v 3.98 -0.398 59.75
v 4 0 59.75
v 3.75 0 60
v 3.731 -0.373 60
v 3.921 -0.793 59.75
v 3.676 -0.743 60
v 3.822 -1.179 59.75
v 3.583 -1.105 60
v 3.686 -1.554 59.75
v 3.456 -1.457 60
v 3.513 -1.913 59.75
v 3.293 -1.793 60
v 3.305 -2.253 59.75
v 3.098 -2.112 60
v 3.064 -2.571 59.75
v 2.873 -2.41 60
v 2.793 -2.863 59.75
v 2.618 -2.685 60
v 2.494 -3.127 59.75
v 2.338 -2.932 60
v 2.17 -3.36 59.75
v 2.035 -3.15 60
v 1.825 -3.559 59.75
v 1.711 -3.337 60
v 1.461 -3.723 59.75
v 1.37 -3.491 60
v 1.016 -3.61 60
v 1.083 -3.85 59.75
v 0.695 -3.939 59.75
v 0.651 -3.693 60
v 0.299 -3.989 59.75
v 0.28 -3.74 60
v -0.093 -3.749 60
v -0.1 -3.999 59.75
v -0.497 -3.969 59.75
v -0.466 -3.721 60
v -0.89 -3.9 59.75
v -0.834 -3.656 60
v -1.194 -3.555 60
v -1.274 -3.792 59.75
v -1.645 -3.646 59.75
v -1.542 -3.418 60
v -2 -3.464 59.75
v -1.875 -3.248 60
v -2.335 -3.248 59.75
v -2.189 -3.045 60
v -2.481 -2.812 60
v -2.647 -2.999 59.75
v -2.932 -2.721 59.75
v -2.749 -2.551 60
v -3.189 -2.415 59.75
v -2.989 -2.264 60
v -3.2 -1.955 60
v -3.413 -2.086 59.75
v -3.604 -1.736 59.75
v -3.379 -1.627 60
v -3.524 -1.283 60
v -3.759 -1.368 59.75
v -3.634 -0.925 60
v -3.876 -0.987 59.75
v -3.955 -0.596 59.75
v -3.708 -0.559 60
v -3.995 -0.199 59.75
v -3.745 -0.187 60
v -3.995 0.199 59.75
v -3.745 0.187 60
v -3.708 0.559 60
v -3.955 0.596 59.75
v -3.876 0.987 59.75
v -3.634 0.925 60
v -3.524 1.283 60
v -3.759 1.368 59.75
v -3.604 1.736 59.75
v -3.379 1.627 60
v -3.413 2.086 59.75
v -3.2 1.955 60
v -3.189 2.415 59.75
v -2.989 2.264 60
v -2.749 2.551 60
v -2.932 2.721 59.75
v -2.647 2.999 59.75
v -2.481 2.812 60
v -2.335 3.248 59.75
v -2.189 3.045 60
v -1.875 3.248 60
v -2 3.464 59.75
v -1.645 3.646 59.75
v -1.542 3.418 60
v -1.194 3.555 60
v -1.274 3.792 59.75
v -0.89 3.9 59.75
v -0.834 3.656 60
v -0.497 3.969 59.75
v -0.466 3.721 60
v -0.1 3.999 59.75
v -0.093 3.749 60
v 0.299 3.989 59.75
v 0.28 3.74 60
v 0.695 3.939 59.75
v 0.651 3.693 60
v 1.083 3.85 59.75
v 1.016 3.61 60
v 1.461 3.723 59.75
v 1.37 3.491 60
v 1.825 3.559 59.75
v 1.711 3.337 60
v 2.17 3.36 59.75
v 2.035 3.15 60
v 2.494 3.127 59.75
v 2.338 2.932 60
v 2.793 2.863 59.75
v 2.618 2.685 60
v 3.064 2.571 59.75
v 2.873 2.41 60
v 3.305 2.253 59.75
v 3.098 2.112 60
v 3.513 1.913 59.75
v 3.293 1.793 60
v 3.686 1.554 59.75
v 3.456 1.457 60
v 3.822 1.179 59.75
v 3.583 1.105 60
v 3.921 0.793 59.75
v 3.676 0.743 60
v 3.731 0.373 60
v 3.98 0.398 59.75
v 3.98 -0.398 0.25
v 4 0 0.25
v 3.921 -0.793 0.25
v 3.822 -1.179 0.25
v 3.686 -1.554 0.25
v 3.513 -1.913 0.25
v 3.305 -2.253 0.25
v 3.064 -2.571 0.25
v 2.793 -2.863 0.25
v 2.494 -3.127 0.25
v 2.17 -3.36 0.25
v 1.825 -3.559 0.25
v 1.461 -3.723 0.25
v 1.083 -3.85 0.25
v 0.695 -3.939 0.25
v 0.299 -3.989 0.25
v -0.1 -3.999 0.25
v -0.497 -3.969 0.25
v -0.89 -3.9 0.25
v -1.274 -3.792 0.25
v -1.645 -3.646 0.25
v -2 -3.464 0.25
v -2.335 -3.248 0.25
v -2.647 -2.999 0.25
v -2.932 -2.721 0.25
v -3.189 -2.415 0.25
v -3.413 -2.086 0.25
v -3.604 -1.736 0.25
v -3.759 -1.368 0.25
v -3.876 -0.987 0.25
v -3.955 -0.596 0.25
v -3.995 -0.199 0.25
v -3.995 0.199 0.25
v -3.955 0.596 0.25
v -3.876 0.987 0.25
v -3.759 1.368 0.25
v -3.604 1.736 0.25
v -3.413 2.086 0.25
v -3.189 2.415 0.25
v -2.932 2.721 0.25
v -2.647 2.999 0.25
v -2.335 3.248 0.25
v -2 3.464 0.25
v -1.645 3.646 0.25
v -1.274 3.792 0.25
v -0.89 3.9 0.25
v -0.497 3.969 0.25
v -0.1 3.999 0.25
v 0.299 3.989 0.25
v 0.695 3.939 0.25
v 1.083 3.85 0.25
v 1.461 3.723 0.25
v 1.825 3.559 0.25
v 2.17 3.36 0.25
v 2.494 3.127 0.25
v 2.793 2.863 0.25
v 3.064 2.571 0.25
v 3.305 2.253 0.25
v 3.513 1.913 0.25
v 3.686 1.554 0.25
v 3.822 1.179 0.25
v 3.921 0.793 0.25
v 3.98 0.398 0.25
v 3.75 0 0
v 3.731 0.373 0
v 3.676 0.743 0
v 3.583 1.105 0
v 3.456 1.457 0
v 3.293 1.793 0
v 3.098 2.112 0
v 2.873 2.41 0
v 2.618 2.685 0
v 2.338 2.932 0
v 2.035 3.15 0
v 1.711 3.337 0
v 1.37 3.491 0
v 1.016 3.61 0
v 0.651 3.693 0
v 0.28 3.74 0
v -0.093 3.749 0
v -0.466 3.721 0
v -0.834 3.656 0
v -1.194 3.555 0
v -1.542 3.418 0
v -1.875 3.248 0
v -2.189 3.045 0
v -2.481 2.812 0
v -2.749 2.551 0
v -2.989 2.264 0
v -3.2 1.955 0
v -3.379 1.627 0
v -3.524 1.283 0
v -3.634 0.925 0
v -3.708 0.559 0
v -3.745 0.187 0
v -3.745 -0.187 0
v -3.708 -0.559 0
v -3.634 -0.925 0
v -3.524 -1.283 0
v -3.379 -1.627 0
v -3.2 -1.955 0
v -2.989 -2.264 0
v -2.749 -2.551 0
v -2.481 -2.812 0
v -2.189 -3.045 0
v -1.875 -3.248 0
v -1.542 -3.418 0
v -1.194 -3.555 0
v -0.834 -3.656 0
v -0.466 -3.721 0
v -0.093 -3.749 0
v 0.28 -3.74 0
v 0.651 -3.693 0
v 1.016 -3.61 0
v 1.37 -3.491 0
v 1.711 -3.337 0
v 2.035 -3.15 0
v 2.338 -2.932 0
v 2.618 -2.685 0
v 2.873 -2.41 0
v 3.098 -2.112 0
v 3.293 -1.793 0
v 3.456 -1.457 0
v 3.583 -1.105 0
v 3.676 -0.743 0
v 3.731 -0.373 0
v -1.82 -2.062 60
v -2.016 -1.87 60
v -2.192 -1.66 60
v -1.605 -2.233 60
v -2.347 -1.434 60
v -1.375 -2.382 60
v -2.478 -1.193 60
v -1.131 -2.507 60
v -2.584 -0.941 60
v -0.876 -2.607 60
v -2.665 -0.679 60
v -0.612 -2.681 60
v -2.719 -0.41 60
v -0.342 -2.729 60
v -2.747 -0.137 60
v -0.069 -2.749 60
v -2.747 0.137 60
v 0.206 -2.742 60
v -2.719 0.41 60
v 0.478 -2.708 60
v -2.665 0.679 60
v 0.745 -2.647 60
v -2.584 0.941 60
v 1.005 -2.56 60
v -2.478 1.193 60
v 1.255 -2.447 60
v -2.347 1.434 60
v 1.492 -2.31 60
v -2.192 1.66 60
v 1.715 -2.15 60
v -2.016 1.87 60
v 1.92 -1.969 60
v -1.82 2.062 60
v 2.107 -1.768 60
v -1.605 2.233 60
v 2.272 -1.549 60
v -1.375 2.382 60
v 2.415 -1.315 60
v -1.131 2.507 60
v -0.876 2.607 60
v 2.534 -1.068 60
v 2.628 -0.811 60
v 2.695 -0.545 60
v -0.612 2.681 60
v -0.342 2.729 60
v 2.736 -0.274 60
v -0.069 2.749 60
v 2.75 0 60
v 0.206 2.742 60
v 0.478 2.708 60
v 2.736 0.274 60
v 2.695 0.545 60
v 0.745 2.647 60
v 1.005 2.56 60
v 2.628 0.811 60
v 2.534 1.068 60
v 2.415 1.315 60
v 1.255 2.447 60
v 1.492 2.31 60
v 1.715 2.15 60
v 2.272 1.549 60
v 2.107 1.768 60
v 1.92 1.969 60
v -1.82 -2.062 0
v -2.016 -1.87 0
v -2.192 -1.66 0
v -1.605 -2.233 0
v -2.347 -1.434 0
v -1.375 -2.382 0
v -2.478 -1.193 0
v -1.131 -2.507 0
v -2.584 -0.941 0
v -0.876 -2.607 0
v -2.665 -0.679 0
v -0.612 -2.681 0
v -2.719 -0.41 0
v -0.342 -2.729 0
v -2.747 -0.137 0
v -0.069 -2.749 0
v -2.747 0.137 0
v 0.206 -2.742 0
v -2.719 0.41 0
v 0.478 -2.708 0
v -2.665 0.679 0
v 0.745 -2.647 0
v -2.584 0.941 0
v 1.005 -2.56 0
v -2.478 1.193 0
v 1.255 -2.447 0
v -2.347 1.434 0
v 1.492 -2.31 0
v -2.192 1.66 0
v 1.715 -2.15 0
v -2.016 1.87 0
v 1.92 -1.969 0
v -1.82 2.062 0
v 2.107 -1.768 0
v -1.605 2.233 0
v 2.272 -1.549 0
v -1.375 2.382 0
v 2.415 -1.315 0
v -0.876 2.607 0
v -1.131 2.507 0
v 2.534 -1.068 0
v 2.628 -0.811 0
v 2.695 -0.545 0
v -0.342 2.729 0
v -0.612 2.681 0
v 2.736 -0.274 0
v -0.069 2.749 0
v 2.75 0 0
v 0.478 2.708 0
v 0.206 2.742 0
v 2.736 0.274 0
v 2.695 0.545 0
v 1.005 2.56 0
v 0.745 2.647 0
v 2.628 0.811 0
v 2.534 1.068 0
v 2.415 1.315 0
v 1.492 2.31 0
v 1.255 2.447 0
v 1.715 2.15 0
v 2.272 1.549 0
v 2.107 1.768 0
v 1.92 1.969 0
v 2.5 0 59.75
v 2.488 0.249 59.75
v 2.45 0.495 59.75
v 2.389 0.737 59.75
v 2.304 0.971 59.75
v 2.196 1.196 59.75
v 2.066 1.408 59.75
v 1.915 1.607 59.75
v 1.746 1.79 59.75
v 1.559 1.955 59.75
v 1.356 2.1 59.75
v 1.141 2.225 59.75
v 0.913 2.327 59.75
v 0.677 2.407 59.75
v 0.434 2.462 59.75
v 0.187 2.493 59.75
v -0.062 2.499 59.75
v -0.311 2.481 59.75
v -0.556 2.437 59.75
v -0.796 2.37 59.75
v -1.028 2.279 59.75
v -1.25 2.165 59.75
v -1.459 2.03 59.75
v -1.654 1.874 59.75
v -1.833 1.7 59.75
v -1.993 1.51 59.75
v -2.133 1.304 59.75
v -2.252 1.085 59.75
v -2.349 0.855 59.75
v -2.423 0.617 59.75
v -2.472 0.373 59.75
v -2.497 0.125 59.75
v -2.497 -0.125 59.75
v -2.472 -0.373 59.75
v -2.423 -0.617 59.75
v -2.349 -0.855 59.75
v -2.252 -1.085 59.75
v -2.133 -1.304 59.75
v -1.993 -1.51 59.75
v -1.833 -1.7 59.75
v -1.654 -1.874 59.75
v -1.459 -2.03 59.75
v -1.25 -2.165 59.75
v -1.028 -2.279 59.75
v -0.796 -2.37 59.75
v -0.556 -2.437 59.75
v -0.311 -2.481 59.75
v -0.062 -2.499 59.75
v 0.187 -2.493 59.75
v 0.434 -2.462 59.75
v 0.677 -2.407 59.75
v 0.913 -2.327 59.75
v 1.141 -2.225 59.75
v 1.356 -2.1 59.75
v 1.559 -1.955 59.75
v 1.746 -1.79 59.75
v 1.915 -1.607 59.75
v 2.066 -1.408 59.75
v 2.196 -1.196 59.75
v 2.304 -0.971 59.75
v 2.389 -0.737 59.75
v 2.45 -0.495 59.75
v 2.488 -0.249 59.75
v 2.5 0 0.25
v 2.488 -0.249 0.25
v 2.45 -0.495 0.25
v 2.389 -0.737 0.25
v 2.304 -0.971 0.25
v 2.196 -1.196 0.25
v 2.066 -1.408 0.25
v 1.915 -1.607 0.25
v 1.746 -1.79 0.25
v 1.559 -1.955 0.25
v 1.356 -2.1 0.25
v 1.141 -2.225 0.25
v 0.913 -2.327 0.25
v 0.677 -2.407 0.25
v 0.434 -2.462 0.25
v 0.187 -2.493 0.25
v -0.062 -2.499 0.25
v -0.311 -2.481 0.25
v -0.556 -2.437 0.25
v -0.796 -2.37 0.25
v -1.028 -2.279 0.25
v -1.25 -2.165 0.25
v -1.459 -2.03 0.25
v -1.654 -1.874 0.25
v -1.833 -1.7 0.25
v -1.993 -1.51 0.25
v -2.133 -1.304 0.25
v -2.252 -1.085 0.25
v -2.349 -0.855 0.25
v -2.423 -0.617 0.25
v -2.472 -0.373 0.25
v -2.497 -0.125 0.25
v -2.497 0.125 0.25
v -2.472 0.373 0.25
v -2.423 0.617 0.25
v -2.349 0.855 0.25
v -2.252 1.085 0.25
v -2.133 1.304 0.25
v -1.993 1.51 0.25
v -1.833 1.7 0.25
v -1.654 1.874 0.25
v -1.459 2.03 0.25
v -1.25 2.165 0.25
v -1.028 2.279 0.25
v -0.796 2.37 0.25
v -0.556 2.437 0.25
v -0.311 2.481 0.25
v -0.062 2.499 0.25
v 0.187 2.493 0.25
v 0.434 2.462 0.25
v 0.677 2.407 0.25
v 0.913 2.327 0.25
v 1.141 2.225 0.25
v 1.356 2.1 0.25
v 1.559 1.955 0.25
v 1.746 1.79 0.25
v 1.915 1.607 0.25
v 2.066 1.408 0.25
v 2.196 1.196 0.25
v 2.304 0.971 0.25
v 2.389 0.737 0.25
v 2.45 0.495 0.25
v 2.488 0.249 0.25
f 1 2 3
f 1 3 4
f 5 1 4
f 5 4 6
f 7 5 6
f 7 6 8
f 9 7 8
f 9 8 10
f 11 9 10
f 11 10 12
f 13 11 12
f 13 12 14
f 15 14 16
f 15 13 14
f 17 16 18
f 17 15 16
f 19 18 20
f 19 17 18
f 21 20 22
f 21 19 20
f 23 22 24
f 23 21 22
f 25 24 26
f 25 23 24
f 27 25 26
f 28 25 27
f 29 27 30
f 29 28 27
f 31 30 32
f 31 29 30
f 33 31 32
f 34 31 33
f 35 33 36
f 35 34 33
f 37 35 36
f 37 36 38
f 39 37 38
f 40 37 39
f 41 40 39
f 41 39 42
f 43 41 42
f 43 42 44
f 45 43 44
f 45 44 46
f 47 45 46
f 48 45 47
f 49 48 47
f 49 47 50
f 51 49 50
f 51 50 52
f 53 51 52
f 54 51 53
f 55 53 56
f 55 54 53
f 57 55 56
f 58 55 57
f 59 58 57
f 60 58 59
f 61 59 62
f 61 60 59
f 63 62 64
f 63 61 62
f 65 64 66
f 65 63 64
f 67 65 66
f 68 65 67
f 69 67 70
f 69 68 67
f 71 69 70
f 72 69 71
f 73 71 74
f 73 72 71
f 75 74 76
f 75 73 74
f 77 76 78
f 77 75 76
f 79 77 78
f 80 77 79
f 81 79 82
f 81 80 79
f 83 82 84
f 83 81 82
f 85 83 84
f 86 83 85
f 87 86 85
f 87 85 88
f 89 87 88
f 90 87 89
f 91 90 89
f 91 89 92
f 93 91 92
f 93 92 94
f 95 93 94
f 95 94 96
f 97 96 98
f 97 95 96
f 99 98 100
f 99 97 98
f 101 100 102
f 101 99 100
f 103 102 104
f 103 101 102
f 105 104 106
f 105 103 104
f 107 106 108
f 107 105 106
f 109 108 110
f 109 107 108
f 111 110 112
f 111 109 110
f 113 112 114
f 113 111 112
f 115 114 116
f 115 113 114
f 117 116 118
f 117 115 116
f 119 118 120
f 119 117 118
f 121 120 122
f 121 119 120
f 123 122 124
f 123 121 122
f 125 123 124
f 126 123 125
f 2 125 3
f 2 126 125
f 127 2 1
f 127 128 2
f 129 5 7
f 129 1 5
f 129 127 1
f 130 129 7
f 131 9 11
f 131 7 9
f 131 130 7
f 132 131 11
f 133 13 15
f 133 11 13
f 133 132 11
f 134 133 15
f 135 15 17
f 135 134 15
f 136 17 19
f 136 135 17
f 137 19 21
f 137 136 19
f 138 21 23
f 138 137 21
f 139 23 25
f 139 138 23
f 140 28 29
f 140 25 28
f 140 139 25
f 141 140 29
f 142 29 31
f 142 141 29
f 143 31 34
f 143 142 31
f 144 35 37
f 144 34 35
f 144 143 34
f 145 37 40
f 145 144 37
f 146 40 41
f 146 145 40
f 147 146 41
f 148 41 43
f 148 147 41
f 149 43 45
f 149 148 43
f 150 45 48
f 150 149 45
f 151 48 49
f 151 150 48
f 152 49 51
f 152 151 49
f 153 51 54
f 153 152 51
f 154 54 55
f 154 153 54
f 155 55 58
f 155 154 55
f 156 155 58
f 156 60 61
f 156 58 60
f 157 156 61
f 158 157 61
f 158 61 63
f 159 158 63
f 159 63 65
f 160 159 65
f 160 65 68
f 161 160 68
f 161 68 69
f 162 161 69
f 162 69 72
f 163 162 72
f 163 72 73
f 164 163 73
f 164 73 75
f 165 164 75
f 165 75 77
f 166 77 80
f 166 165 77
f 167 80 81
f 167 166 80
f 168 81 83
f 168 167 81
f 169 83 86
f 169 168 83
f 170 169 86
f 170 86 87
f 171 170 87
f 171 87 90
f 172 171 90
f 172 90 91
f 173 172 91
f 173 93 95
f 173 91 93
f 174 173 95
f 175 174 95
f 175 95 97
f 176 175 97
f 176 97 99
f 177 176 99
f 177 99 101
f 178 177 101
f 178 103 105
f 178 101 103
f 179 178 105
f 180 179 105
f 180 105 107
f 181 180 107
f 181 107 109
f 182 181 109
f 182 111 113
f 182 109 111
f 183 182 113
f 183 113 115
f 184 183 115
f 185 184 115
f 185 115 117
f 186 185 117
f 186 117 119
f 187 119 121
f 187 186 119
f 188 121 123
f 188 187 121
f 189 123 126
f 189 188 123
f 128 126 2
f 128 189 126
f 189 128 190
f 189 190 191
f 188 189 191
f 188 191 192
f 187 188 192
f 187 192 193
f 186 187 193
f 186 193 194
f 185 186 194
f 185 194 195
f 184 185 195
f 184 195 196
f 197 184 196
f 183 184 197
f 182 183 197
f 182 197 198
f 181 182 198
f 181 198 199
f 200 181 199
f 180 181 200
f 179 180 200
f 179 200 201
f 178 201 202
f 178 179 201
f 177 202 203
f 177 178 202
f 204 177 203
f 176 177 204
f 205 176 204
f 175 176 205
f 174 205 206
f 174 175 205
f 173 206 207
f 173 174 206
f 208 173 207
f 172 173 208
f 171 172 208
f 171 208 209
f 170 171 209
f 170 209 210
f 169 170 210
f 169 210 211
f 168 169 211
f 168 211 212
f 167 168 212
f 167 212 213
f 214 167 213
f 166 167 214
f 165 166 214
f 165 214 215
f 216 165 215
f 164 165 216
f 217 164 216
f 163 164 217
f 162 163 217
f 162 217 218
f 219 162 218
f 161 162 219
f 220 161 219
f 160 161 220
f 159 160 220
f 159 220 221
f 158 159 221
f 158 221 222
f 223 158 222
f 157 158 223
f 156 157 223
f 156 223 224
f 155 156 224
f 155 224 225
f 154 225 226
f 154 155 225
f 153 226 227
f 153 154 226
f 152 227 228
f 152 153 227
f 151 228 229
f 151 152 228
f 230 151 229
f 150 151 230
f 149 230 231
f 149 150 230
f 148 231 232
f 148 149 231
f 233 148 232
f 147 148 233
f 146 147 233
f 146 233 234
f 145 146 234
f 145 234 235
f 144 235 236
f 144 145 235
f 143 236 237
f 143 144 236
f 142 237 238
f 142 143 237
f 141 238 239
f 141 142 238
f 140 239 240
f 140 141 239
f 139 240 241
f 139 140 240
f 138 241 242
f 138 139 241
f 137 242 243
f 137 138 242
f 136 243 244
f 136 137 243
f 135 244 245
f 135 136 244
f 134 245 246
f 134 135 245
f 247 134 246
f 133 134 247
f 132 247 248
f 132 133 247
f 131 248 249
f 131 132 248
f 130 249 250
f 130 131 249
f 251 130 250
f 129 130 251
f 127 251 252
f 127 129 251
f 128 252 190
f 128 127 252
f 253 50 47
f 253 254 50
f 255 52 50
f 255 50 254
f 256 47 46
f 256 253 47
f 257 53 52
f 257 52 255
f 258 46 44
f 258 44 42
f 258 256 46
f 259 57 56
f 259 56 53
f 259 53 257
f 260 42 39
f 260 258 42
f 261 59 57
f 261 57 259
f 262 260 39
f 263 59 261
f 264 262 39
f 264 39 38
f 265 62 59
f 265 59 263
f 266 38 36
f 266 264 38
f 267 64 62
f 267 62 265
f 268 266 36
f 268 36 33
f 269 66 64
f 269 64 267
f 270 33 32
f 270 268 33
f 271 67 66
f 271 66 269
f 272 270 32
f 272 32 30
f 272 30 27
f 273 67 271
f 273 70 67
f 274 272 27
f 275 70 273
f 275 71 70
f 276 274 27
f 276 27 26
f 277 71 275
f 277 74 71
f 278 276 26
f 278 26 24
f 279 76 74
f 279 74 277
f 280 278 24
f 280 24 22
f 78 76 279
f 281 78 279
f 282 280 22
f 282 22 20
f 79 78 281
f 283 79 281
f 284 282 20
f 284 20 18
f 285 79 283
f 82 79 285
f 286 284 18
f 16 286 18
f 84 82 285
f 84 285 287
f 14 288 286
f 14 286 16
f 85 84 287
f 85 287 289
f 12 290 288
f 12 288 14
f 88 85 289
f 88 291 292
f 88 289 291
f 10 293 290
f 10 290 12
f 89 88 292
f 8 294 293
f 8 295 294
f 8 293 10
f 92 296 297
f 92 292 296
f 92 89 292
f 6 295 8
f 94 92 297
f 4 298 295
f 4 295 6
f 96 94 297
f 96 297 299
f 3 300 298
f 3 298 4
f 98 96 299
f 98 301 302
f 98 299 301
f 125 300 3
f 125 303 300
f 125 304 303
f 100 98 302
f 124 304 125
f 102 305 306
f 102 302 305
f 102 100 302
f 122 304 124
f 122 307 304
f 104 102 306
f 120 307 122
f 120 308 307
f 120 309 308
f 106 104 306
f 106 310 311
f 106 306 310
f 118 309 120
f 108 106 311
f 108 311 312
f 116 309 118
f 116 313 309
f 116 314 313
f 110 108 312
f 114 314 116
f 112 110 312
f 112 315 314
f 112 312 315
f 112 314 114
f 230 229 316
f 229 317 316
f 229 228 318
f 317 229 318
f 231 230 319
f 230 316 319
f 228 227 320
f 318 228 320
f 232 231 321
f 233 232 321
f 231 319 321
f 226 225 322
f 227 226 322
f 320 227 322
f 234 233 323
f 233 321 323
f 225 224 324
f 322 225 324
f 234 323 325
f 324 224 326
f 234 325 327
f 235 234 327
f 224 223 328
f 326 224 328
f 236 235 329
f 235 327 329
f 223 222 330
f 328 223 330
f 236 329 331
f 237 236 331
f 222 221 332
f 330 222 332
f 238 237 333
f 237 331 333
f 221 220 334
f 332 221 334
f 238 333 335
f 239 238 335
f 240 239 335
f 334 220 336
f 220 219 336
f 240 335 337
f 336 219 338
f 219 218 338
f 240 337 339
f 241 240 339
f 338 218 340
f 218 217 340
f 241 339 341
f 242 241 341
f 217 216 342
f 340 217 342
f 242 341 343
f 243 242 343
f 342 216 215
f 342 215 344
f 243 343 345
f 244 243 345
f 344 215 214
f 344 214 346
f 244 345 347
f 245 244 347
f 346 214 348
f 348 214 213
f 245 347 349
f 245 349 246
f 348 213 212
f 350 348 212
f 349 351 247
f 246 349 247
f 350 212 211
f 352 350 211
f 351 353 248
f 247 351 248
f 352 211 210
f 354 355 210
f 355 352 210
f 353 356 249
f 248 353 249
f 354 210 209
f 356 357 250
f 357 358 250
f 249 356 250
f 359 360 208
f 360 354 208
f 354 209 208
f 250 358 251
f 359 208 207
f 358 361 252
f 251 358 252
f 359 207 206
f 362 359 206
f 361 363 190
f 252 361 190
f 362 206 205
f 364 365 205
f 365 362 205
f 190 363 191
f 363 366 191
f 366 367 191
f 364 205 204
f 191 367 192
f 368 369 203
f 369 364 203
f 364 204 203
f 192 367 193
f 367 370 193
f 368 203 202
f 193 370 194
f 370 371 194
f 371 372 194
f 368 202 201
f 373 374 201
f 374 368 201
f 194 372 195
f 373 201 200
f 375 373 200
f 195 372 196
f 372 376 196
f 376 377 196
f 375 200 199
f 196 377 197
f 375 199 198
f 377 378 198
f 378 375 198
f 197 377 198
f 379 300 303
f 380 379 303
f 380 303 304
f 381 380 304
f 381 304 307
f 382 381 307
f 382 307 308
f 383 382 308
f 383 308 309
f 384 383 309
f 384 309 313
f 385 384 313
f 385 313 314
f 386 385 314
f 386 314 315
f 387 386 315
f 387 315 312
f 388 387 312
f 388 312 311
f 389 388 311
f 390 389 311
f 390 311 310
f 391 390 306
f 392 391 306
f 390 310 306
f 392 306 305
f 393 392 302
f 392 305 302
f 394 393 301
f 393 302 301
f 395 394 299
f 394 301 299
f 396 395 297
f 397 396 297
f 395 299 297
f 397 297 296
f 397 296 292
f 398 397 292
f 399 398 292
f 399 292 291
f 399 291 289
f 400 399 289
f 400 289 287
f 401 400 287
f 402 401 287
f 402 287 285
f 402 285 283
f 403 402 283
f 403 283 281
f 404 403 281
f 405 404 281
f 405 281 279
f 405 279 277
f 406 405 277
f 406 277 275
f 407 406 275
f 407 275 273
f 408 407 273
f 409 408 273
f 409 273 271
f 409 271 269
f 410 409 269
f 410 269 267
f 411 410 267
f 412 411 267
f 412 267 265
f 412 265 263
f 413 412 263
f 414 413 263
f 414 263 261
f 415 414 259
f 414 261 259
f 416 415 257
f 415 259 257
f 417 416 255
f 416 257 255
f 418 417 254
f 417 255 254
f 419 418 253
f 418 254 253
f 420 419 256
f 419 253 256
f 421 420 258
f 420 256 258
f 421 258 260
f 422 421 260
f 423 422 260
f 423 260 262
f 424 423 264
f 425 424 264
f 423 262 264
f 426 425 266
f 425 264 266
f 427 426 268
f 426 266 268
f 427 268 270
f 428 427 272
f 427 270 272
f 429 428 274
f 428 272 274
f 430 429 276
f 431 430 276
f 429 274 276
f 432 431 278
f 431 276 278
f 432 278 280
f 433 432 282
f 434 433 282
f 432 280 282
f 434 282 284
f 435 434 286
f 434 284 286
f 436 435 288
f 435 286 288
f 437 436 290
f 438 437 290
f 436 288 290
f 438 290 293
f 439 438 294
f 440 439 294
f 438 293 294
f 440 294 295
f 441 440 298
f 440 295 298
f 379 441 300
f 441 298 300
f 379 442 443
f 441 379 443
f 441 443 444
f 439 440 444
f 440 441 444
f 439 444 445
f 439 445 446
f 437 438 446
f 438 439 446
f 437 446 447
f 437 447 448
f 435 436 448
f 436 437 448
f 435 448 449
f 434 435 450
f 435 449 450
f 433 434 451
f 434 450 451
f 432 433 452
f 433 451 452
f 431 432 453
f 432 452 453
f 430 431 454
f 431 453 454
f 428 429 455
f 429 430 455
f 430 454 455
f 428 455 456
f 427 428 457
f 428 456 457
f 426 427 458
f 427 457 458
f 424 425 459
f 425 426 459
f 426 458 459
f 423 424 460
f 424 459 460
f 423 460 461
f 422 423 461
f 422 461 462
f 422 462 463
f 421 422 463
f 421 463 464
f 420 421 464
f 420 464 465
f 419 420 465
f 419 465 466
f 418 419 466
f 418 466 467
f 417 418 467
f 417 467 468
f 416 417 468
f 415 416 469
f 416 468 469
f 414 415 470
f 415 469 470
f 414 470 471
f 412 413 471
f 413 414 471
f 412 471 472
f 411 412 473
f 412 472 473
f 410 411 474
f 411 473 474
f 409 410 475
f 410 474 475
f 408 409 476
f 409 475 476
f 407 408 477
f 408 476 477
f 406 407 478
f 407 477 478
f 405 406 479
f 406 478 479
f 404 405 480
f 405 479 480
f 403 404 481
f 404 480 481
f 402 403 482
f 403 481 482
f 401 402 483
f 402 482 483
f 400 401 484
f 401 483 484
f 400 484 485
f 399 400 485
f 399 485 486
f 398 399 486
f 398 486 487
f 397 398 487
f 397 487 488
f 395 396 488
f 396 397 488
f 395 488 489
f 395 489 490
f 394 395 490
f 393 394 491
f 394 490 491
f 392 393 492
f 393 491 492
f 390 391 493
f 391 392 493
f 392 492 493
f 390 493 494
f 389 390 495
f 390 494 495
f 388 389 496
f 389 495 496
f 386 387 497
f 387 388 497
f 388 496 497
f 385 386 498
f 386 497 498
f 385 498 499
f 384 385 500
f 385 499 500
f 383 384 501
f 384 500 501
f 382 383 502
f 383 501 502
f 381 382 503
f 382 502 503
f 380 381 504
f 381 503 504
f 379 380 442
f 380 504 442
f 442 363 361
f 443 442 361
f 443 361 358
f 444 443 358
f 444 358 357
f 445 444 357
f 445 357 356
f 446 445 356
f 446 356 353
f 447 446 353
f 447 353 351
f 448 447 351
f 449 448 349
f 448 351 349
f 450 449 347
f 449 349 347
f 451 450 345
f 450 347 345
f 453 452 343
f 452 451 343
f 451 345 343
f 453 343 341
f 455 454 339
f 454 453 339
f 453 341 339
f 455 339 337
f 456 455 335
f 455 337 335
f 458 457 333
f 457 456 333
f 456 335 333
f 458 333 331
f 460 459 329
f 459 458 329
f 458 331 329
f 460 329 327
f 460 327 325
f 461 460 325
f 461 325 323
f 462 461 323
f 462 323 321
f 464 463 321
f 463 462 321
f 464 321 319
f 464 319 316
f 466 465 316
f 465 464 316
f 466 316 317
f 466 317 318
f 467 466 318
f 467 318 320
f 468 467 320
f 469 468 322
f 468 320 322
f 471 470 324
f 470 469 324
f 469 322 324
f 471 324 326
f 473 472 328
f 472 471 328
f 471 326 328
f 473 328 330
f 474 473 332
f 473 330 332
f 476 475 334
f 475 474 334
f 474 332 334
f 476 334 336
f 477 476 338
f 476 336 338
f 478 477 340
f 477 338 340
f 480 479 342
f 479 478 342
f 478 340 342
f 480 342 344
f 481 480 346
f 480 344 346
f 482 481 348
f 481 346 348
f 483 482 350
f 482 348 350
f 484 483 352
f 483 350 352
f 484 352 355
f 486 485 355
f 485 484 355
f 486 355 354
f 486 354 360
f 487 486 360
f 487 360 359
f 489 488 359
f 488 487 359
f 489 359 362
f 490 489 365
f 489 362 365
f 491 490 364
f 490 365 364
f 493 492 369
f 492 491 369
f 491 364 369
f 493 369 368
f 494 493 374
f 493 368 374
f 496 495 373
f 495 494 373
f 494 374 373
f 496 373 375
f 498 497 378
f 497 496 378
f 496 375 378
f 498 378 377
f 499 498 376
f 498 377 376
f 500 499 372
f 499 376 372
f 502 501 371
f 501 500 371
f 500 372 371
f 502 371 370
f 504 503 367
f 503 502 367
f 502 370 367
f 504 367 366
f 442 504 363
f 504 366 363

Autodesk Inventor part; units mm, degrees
ref_plane "YZ Plane" through (0, 0, 0) normal (1, 0, 0) x (0, 1, 0)
ref_plane "XZ Plane" through (0, 0, 0) normal (0, 1, 0) x (-1, 0, 0)
ref_plane "XY Plane" through (0, 0, 0) normal (0, 0, 1) x (1, 0, 0)
sketch "Sketch1" plane through (0, 0, 0) normal (0, 0, 1) x (1, 0, 0)
  circle A0 centre (0, 0) radius 4
  circle A1 centre (0, 0) radius 2.5
  dimension "d0" = 8
  dimension "d1" = 5
extrude "Extrusion1" add sketch "Sketch1" along normal blind 60
chamfer "Chamfer1" distance 0.25 angle 45 4 edges at (-4, 0, 0) (-4, 0, 60) (-2.5, 0, 0) (-2.5, 0, 60)
thread "Thread1" size "M5x0.8" class "6H" standard "ANSI Metric M Profile" length 10
thread "Thread2" size "M5x0.8" class "6H" standard "ANSI Metric M Profile" length 10
properties part number "60mm M5 Standoff" material "Aluminum 6061"
